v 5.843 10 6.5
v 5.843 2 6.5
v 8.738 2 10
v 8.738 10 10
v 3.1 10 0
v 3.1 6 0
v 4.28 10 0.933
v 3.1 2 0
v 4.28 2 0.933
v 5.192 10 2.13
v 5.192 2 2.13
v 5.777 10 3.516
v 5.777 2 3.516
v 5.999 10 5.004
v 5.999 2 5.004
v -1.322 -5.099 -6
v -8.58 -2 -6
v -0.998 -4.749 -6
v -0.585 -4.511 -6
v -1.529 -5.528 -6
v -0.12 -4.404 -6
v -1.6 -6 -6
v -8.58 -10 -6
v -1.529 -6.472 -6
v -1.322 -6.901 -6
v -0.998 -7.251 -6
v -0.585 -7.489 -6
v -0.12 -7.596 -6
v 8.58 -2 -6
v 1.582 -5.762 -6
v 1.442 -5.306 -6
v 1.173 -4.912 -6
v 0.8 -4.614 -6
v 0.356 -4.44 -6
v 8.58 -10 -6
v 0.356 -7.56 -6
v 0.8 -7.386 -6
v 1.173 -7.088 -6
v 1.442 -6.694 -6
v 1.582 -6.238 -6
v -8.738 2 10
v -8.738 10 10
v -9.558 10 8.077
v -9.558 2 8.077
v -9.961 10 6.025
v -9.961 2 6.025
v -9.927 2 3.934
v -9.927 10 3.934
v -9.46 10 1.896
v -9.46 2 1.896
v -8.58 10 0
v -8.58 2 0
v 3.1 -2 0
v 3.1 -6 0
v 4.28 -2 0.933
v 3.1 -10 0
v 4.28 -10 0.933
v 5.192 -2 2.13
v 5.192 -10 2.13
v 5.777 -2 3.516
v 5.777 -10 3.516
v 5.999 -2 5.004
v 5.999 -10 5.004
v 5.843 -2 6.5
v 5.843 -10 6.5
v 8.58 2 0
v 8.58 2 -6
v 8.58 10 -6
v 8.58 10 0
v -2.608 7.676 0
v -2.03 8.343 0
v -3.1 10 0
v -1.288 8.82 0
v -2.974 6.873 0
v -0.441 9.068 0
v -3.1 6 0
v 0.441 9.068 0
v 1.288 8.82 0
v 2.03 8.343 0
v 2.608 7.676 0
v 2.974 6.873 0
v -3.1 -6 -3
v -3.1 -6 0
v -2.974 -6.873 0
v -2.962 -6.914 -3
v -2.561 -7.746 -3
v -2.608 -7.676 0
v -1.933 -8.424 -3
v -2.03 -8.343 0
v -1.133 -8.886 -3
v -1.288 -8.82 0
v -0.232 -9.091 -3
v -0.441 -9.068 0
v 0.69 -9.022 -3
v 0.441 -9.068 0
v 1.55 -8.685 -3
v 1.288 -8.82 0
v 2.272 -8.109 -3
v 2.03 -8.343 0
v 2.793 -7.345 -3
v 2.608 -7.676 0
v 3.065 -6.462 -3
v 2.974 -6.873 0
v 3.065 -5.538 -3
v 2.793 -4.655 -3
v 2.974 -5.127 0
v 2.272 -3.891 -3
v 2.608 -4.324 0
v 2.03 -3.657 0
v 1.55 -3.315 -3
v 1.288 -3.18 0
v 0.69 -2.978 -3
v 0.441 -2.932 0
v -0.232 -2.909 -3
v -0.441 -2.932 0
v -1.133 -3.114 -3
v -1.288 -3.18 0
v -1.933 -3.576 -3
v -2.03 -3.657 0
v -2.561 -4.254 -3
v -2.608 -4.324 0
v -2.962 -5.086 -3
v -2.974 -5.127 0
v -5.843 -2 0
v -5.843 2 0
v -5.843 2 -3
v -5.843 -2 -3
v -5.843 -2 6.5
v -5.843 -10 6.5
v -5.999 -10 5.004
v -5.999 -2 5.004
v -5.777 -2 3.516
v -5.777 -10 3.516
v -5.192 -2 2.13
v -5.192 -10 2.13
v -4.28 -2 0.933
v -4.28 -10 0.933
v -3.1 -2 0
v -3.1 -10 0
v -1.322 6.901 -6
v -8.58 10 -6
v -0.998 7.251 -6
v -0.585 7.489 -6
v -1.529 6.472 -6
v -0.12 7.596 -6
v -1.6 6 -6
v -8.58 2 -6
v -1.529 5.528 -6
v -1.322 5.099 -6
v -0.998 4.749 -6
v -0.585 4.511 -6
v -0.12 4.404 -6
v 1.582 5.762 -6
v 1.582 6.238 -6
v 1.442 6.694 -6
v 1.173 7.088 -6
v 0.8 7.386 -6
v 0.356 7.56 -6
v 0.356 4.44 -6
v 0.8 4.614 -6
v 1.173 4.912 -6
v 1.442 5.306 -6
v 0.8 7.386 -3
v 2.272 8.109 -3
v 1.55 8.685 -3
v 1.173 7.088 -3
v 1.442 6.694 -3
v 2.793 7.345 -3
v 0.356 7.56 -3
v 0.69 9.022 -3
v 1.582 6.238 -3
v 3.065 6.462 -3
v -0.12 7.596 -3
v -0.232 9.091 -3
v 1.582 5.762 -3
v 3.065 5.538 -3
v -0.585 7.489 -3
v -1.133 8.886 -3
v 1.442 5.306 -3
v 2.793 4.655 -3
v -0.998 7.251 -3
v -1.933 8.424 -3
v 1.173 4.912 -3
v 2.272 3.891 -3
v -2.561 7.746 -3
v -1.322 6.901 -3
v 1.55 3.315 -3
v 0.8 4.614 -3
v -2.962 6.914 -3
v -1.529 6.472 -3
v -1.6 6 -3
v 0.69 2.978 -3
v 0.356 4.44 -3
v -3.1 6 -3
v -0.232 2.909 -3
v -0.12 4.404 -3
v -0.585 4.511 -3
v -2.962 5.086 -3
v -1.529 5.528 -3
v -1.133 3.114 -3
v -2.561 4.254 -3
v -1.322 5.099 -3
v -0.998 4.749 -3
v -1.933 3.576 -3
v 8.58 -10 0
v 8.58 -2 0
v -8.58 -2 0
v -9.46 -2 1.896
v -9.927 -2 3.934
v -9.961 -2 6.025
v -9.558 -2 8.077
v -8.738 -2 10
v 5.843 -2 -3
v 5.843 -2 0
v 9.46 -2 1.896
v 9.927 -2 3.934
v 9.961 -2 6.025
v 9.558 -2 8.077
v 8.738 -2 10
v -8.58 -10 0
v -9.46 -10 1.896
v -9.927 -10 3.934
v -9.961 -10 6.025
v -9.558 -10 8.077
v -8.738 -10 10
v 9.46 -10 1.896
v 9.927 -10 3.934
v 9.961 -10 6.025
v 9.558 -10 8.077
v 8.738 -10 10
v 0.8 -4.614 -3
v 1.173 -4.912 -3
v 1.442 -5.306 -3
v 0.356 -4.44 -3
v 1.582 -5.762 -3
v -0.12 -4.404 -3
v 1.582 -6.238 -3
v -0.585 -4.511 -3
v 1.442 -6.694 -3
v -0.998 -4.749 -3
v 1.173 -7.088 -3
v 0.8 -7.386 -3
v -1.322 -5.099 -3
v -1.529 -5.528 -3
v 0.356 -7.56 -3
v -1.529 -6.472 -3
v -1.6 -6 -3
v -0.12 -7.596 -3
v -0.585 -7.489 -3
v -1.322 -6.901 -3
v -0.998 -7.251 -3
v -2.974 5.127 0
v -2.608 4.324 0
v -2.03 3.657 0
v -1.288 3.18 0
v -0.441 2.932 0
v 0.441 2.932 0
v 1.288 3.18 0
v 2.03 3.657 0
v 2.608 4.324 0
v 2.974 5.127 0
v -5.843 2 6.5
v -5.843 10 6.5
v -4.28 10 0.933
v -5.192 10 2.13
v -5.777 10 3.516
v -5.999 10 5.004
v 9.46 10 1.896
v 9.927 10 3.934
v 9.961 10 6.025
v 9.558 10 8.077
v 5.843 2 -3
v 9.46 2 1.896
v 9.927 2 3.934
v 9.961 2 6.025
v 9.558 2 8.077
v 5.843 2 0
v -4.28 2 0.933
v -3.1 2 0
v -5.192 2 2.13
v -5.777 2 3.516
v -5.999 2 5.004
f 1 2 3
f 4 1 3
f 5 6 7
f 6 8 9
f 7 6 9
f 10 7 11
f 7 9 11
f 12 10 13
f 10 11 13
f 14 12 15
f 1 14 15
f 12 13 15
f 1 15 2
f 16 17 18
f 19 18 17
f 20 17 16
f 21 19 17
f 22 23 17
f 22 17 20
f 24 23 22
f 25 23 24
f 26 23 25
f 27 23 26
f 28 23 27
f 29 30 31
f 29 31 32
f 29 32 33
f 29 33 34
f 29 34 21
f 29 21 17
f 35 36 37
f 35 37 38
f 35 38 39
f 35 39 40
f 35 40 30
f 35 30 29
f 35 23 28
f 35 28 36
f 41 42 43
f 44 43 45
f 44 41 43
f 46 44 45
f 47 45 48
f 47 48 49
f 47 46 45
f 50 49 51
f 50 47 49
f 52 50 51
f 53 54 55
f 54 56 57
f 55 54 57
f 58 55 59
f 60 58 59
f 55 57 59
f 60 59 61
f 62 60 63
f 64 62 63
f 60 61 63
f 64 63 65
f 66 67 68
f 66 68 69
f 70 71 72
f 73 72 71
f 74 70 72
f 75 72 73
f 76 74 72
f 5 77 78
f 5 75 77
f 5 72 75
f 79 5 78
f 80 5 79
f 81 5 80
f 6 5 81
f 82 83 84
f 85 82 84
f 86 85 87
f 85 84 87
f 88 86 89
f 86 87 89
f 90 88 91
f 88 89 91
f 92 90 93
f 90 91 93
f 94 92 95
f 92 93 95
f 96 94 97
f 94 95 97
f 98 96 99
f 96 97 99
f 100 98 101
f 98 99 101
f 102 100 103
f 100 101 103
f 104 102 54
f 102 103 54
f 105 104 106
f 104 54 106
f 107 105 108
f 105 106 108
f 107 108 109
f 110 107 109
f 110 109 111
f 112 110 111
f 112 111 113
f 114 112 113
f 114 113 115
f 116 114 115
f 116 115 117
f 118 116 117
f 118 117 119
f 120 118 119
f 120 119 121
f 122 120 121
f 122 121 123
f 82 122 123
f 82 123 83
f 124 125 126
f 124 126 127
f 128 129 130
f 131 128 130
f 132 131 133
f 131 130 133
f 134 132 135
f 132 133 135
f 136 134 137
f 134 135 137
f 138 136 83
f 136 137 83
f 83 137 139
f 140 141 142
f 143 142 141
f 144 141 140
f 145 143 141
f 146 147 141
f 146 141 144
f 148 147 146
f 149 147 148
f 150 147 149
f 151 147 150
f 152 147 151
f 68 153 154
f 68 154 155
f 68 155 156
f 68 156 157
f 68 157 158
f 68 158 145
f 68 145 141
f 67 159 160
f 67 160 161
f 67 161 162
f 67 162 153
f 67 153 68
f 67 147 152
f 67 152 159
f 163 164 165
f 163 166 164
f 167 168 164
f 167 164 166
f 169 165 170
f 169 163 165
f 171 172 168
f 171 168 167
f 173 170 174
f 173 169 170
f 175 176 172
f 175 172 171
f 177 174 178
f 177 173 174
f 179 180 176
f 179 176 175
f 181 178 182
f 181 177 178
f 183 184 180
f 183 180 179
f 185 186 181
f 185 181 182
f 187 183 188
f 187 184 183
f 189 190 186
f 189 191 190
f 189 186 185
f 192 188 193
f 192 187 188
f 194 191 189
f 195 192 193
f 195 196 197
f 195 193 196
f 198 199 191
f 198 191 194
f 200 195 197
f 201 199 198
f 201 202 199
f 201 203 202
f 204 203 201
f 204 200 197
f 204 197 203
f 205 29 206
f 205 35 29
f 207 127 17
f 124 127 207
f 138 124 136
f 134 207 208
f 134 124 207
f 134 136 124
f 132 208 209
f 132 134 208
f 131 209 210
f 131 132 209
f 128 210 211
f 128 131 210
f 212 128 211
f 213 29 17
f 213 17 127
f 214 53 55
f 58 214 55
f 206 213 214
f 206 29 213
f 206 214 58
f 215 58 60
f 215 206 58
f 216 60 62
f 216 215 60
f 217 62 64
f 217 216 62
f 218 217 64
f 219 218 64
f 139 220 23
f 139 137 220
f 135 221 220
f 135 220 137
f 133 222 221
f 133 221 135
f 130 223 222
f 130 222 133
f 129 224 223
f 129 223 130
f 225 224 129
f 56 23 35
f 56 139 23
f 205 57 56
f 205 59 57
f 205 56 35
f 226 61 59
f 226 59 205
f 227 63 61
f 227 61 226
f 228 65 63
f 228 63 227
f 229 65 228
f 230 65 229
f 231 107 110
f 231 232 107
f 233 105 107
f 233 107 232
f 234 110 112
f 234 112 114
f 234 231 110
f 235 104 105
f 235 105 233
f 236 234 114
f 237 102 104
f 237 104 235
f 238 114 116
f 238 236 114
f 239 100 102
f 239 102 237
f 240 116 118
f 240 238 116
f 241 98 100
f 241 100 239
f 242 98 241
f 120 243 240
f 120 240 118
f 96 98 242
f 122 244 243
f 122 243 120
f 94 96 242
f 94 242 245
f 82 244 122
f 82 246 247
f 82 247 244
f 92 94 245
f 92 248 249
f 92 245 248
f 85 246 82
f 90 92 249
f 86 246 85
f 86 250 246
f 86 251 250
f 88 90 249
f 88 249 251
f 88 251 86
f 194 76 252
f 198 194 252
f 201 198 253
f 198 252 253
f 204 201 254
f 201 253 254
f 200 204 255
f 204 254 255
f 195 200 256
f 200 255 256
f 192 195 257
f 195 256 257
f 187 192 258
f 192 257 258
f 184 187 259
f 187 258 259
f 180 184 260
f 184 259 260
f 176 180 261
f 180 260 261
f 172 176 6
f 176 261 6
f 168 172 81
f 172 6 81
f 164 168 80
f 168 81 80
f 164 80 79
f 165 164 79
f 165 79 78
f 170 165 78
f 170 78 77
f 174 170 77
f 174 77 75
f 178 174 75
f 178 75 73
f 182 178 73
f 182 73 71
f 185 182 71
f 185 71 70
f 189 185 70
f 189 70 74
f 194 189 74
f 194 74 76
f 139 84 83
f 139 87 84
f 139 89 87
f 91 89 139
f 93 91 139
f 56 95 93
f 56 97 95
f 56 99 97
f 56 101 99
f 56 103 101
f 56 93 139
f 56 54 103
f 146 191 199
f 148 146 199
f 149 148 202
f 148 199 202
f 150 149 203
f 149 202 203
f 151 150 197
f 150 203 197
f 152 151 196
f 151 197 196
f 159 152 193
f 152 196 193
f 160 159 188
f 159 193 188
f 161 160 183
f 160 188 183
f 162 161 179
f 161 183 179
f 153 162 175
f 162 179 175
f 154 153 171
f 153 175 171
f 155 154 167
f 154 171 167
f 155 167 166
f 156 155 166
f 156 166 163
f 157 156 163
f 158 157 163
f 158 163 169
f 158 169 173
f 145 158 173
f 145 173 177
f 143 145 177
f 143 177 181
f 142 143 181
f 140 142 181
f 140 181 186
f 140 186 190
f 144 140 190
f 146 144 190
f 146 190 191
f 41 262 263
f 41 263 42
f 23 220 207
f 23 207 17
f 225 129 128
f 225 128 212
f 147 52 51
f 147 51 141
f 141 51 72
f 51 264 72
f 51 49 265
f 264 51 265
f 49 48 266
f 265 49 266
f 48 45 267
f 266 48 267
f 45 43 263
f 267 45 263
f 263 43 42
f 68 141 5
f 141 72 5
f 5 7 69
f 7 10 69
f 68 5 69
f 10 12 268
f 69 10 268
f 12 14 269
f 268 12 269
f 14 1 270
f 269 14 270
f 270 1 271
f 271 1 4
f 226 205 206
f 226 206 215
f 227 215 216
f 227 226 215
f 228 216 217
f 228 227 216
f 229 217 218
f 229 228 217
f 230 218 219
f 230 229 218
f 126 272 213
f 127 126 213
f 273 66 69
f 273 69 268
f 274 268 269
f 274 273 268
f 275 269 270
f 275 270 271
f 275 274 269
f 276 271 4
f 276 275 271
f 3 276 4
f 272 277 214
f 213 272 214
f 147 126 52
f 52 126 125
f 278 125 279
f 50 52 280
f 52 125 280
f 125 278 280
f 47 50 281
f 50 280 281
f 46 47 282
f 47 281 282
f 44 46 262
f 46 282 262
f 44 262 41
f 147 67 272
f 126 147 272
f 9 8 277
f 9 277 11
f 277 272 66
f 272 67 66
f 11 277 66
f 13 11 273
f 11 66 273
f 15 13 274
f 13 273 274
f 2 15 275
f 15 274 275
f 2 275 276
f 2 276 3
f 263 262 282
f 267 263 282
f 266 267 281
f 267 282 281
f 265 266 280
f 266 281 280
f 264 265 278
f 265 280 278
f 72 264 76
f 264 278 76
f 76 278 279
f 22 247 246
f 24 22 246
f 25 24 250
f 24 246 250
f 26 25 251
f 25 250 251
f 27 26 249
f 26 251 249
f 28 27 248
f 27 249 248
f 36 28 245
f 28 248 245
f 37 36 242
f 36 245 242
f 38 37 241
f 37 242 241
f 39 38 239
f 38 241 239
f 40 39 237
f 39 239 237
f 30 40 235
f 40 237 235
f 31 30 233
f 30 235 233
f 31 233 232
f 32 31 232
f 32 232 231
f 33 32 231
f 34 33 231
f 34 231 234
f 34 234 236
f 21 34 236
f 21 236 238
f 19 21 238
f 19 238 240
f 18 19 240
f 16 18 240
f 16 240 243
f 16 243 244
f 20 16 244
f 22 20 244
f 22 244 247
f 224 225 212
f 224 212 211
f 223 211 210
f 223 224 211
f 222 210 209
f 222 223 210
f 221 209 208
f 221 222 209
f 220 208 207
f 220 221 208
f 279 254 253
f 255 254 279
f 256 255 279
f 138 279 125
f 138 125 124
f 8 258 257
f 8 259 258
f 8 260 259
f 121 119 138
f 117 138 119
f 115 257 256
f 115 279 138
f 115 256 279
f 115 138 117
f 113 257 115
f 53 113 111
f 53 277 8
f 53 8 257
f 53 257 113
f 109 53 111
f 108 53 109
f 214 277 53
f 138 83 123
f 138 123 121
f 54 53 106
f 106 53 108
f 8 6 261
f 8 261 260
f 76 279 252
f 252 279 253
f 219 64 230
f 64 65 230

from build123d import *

# Parameters (mm, degrees)
PAD_DEPTH         = 10
SKETCH001_W       = 10
SKETCH001_H       = 4
SKETCH001_W_2     = 3
POCKET_DEPTH      = 18.580627
POCKET_DEPTH_BACK = -1.421373
SKETCH002_R       = 1.6
POCKET001_DEPTH   = 6.001
SKETCH003_R       = 3.1
POCKET002_DEPTH   = 3
SKETCH004_W       = 2.736464
SKETCH004_H       = 4
POCKET003_DEPTH   = 5


with BuildPart() as part:
    # Sketch → Pad (new body, symmetric)
    with BuildSketch(Plane.XZ):
        with BuildLine():
            ThreePointArc((-8.737986, 10), (-9.998746, 4.978781), (-8.579627, 0))
            Line((-8.579627, 0), (-8.579627, -6))
            Line((-8.579627, -6), (8.579627, -6))
            Line((8.579627, -6), (8.579627, 0))
            ThreePointArc((8.579627, 0), (9.998746, 4.978781), (8.737986, 10))
            Line((5.843163, 6.5), (8.737986, 10))
            ThreePointArc((3.1, 0), (5.527888, 2.804212), (5.843163, 6.5))
            Line((-3.1, 0), (3.1, 0))
            ThreePointArc((-5.843163, 6.5), (-5.527888, 2.804212), (-3.1, 0))
            Line((-5.843163, 6.5), (-8.737986, 10))
        make_face()
    extrude(amount=PAD_DEPTH, both=True)

    # Sketch001 (on Face5 of Pad) → Pocket (cut, two sides)
    with BuildSketch(Plane(origin=(8.579627, 0, 0), x_dir=(0, 0, 1), z_dir=(1, 0, 0))) as pocket_sk:
        with Locations((5, 0)):
            Rectangle(SKETCH001_W, SKETCH001_H)
        with Locations((-4.5, 0)):
            Rectangle(SKETCH001_W_2, SKETCH001_H)
    extrude(amount=-POCKET_DEPTH, mode=Mode.SUBTRACT)
    extrude(pocket_sk.sketch, amount=-POCKET_DEPTH_BACK, mode=Mode.SUBTRACT)

    # Sketch002 (on Face12 of Pocket) → Pocket001 (cut, through all)
    with BuildSketch(Plane(origin=(0, 0, 0), x_dir=(-1, 0, 0), z_dir=(0, 0, 1))):
        with Locations((0, 6)):
            Circle(SKETCH002_R)
        with Locations((0, -6)):
            Circle(SKETCH002_R)
    extrude(amount=-POCKET001_DEPTH, mode=Mode.SUBTRACT)

    # Sketch003 (on Face30 of Pocket001) → Pocket002 (cut)
    with BuildSketch(Plane(origin=(0, 0, 0), x_dir=(-1, 0, 0), z_dir=(0, 0, 1))):
        with Locations((0, 6)):
            Circle(SKETCH003_R)
        with Locations((0, -6)):
            Circle(SKETCH003_R)
    extrude(amount=-POCKET002_DEPTH, mode=Mode.SUBTRACT)

    # Sketch004 (on Face13 of Pocket002) → Pocket003 (cut)
    with BuildSketch(Plane(origin=(0, 0, 0), x_dir=(-1, 0, 0), z_dir=(0, 0, 1))):
        with Locations((-7.211395, 0)):
            Rectangle(SKETCH004_W, SKETCH004_H)
        with Locations((7.211395, 0)):
            Rectangle(SKETCH004_W, SKETCH004_H)
    extrude(amount=-POCKET003_DEPTH, mode=Mode.SUBTRACT)


solid = part.part
